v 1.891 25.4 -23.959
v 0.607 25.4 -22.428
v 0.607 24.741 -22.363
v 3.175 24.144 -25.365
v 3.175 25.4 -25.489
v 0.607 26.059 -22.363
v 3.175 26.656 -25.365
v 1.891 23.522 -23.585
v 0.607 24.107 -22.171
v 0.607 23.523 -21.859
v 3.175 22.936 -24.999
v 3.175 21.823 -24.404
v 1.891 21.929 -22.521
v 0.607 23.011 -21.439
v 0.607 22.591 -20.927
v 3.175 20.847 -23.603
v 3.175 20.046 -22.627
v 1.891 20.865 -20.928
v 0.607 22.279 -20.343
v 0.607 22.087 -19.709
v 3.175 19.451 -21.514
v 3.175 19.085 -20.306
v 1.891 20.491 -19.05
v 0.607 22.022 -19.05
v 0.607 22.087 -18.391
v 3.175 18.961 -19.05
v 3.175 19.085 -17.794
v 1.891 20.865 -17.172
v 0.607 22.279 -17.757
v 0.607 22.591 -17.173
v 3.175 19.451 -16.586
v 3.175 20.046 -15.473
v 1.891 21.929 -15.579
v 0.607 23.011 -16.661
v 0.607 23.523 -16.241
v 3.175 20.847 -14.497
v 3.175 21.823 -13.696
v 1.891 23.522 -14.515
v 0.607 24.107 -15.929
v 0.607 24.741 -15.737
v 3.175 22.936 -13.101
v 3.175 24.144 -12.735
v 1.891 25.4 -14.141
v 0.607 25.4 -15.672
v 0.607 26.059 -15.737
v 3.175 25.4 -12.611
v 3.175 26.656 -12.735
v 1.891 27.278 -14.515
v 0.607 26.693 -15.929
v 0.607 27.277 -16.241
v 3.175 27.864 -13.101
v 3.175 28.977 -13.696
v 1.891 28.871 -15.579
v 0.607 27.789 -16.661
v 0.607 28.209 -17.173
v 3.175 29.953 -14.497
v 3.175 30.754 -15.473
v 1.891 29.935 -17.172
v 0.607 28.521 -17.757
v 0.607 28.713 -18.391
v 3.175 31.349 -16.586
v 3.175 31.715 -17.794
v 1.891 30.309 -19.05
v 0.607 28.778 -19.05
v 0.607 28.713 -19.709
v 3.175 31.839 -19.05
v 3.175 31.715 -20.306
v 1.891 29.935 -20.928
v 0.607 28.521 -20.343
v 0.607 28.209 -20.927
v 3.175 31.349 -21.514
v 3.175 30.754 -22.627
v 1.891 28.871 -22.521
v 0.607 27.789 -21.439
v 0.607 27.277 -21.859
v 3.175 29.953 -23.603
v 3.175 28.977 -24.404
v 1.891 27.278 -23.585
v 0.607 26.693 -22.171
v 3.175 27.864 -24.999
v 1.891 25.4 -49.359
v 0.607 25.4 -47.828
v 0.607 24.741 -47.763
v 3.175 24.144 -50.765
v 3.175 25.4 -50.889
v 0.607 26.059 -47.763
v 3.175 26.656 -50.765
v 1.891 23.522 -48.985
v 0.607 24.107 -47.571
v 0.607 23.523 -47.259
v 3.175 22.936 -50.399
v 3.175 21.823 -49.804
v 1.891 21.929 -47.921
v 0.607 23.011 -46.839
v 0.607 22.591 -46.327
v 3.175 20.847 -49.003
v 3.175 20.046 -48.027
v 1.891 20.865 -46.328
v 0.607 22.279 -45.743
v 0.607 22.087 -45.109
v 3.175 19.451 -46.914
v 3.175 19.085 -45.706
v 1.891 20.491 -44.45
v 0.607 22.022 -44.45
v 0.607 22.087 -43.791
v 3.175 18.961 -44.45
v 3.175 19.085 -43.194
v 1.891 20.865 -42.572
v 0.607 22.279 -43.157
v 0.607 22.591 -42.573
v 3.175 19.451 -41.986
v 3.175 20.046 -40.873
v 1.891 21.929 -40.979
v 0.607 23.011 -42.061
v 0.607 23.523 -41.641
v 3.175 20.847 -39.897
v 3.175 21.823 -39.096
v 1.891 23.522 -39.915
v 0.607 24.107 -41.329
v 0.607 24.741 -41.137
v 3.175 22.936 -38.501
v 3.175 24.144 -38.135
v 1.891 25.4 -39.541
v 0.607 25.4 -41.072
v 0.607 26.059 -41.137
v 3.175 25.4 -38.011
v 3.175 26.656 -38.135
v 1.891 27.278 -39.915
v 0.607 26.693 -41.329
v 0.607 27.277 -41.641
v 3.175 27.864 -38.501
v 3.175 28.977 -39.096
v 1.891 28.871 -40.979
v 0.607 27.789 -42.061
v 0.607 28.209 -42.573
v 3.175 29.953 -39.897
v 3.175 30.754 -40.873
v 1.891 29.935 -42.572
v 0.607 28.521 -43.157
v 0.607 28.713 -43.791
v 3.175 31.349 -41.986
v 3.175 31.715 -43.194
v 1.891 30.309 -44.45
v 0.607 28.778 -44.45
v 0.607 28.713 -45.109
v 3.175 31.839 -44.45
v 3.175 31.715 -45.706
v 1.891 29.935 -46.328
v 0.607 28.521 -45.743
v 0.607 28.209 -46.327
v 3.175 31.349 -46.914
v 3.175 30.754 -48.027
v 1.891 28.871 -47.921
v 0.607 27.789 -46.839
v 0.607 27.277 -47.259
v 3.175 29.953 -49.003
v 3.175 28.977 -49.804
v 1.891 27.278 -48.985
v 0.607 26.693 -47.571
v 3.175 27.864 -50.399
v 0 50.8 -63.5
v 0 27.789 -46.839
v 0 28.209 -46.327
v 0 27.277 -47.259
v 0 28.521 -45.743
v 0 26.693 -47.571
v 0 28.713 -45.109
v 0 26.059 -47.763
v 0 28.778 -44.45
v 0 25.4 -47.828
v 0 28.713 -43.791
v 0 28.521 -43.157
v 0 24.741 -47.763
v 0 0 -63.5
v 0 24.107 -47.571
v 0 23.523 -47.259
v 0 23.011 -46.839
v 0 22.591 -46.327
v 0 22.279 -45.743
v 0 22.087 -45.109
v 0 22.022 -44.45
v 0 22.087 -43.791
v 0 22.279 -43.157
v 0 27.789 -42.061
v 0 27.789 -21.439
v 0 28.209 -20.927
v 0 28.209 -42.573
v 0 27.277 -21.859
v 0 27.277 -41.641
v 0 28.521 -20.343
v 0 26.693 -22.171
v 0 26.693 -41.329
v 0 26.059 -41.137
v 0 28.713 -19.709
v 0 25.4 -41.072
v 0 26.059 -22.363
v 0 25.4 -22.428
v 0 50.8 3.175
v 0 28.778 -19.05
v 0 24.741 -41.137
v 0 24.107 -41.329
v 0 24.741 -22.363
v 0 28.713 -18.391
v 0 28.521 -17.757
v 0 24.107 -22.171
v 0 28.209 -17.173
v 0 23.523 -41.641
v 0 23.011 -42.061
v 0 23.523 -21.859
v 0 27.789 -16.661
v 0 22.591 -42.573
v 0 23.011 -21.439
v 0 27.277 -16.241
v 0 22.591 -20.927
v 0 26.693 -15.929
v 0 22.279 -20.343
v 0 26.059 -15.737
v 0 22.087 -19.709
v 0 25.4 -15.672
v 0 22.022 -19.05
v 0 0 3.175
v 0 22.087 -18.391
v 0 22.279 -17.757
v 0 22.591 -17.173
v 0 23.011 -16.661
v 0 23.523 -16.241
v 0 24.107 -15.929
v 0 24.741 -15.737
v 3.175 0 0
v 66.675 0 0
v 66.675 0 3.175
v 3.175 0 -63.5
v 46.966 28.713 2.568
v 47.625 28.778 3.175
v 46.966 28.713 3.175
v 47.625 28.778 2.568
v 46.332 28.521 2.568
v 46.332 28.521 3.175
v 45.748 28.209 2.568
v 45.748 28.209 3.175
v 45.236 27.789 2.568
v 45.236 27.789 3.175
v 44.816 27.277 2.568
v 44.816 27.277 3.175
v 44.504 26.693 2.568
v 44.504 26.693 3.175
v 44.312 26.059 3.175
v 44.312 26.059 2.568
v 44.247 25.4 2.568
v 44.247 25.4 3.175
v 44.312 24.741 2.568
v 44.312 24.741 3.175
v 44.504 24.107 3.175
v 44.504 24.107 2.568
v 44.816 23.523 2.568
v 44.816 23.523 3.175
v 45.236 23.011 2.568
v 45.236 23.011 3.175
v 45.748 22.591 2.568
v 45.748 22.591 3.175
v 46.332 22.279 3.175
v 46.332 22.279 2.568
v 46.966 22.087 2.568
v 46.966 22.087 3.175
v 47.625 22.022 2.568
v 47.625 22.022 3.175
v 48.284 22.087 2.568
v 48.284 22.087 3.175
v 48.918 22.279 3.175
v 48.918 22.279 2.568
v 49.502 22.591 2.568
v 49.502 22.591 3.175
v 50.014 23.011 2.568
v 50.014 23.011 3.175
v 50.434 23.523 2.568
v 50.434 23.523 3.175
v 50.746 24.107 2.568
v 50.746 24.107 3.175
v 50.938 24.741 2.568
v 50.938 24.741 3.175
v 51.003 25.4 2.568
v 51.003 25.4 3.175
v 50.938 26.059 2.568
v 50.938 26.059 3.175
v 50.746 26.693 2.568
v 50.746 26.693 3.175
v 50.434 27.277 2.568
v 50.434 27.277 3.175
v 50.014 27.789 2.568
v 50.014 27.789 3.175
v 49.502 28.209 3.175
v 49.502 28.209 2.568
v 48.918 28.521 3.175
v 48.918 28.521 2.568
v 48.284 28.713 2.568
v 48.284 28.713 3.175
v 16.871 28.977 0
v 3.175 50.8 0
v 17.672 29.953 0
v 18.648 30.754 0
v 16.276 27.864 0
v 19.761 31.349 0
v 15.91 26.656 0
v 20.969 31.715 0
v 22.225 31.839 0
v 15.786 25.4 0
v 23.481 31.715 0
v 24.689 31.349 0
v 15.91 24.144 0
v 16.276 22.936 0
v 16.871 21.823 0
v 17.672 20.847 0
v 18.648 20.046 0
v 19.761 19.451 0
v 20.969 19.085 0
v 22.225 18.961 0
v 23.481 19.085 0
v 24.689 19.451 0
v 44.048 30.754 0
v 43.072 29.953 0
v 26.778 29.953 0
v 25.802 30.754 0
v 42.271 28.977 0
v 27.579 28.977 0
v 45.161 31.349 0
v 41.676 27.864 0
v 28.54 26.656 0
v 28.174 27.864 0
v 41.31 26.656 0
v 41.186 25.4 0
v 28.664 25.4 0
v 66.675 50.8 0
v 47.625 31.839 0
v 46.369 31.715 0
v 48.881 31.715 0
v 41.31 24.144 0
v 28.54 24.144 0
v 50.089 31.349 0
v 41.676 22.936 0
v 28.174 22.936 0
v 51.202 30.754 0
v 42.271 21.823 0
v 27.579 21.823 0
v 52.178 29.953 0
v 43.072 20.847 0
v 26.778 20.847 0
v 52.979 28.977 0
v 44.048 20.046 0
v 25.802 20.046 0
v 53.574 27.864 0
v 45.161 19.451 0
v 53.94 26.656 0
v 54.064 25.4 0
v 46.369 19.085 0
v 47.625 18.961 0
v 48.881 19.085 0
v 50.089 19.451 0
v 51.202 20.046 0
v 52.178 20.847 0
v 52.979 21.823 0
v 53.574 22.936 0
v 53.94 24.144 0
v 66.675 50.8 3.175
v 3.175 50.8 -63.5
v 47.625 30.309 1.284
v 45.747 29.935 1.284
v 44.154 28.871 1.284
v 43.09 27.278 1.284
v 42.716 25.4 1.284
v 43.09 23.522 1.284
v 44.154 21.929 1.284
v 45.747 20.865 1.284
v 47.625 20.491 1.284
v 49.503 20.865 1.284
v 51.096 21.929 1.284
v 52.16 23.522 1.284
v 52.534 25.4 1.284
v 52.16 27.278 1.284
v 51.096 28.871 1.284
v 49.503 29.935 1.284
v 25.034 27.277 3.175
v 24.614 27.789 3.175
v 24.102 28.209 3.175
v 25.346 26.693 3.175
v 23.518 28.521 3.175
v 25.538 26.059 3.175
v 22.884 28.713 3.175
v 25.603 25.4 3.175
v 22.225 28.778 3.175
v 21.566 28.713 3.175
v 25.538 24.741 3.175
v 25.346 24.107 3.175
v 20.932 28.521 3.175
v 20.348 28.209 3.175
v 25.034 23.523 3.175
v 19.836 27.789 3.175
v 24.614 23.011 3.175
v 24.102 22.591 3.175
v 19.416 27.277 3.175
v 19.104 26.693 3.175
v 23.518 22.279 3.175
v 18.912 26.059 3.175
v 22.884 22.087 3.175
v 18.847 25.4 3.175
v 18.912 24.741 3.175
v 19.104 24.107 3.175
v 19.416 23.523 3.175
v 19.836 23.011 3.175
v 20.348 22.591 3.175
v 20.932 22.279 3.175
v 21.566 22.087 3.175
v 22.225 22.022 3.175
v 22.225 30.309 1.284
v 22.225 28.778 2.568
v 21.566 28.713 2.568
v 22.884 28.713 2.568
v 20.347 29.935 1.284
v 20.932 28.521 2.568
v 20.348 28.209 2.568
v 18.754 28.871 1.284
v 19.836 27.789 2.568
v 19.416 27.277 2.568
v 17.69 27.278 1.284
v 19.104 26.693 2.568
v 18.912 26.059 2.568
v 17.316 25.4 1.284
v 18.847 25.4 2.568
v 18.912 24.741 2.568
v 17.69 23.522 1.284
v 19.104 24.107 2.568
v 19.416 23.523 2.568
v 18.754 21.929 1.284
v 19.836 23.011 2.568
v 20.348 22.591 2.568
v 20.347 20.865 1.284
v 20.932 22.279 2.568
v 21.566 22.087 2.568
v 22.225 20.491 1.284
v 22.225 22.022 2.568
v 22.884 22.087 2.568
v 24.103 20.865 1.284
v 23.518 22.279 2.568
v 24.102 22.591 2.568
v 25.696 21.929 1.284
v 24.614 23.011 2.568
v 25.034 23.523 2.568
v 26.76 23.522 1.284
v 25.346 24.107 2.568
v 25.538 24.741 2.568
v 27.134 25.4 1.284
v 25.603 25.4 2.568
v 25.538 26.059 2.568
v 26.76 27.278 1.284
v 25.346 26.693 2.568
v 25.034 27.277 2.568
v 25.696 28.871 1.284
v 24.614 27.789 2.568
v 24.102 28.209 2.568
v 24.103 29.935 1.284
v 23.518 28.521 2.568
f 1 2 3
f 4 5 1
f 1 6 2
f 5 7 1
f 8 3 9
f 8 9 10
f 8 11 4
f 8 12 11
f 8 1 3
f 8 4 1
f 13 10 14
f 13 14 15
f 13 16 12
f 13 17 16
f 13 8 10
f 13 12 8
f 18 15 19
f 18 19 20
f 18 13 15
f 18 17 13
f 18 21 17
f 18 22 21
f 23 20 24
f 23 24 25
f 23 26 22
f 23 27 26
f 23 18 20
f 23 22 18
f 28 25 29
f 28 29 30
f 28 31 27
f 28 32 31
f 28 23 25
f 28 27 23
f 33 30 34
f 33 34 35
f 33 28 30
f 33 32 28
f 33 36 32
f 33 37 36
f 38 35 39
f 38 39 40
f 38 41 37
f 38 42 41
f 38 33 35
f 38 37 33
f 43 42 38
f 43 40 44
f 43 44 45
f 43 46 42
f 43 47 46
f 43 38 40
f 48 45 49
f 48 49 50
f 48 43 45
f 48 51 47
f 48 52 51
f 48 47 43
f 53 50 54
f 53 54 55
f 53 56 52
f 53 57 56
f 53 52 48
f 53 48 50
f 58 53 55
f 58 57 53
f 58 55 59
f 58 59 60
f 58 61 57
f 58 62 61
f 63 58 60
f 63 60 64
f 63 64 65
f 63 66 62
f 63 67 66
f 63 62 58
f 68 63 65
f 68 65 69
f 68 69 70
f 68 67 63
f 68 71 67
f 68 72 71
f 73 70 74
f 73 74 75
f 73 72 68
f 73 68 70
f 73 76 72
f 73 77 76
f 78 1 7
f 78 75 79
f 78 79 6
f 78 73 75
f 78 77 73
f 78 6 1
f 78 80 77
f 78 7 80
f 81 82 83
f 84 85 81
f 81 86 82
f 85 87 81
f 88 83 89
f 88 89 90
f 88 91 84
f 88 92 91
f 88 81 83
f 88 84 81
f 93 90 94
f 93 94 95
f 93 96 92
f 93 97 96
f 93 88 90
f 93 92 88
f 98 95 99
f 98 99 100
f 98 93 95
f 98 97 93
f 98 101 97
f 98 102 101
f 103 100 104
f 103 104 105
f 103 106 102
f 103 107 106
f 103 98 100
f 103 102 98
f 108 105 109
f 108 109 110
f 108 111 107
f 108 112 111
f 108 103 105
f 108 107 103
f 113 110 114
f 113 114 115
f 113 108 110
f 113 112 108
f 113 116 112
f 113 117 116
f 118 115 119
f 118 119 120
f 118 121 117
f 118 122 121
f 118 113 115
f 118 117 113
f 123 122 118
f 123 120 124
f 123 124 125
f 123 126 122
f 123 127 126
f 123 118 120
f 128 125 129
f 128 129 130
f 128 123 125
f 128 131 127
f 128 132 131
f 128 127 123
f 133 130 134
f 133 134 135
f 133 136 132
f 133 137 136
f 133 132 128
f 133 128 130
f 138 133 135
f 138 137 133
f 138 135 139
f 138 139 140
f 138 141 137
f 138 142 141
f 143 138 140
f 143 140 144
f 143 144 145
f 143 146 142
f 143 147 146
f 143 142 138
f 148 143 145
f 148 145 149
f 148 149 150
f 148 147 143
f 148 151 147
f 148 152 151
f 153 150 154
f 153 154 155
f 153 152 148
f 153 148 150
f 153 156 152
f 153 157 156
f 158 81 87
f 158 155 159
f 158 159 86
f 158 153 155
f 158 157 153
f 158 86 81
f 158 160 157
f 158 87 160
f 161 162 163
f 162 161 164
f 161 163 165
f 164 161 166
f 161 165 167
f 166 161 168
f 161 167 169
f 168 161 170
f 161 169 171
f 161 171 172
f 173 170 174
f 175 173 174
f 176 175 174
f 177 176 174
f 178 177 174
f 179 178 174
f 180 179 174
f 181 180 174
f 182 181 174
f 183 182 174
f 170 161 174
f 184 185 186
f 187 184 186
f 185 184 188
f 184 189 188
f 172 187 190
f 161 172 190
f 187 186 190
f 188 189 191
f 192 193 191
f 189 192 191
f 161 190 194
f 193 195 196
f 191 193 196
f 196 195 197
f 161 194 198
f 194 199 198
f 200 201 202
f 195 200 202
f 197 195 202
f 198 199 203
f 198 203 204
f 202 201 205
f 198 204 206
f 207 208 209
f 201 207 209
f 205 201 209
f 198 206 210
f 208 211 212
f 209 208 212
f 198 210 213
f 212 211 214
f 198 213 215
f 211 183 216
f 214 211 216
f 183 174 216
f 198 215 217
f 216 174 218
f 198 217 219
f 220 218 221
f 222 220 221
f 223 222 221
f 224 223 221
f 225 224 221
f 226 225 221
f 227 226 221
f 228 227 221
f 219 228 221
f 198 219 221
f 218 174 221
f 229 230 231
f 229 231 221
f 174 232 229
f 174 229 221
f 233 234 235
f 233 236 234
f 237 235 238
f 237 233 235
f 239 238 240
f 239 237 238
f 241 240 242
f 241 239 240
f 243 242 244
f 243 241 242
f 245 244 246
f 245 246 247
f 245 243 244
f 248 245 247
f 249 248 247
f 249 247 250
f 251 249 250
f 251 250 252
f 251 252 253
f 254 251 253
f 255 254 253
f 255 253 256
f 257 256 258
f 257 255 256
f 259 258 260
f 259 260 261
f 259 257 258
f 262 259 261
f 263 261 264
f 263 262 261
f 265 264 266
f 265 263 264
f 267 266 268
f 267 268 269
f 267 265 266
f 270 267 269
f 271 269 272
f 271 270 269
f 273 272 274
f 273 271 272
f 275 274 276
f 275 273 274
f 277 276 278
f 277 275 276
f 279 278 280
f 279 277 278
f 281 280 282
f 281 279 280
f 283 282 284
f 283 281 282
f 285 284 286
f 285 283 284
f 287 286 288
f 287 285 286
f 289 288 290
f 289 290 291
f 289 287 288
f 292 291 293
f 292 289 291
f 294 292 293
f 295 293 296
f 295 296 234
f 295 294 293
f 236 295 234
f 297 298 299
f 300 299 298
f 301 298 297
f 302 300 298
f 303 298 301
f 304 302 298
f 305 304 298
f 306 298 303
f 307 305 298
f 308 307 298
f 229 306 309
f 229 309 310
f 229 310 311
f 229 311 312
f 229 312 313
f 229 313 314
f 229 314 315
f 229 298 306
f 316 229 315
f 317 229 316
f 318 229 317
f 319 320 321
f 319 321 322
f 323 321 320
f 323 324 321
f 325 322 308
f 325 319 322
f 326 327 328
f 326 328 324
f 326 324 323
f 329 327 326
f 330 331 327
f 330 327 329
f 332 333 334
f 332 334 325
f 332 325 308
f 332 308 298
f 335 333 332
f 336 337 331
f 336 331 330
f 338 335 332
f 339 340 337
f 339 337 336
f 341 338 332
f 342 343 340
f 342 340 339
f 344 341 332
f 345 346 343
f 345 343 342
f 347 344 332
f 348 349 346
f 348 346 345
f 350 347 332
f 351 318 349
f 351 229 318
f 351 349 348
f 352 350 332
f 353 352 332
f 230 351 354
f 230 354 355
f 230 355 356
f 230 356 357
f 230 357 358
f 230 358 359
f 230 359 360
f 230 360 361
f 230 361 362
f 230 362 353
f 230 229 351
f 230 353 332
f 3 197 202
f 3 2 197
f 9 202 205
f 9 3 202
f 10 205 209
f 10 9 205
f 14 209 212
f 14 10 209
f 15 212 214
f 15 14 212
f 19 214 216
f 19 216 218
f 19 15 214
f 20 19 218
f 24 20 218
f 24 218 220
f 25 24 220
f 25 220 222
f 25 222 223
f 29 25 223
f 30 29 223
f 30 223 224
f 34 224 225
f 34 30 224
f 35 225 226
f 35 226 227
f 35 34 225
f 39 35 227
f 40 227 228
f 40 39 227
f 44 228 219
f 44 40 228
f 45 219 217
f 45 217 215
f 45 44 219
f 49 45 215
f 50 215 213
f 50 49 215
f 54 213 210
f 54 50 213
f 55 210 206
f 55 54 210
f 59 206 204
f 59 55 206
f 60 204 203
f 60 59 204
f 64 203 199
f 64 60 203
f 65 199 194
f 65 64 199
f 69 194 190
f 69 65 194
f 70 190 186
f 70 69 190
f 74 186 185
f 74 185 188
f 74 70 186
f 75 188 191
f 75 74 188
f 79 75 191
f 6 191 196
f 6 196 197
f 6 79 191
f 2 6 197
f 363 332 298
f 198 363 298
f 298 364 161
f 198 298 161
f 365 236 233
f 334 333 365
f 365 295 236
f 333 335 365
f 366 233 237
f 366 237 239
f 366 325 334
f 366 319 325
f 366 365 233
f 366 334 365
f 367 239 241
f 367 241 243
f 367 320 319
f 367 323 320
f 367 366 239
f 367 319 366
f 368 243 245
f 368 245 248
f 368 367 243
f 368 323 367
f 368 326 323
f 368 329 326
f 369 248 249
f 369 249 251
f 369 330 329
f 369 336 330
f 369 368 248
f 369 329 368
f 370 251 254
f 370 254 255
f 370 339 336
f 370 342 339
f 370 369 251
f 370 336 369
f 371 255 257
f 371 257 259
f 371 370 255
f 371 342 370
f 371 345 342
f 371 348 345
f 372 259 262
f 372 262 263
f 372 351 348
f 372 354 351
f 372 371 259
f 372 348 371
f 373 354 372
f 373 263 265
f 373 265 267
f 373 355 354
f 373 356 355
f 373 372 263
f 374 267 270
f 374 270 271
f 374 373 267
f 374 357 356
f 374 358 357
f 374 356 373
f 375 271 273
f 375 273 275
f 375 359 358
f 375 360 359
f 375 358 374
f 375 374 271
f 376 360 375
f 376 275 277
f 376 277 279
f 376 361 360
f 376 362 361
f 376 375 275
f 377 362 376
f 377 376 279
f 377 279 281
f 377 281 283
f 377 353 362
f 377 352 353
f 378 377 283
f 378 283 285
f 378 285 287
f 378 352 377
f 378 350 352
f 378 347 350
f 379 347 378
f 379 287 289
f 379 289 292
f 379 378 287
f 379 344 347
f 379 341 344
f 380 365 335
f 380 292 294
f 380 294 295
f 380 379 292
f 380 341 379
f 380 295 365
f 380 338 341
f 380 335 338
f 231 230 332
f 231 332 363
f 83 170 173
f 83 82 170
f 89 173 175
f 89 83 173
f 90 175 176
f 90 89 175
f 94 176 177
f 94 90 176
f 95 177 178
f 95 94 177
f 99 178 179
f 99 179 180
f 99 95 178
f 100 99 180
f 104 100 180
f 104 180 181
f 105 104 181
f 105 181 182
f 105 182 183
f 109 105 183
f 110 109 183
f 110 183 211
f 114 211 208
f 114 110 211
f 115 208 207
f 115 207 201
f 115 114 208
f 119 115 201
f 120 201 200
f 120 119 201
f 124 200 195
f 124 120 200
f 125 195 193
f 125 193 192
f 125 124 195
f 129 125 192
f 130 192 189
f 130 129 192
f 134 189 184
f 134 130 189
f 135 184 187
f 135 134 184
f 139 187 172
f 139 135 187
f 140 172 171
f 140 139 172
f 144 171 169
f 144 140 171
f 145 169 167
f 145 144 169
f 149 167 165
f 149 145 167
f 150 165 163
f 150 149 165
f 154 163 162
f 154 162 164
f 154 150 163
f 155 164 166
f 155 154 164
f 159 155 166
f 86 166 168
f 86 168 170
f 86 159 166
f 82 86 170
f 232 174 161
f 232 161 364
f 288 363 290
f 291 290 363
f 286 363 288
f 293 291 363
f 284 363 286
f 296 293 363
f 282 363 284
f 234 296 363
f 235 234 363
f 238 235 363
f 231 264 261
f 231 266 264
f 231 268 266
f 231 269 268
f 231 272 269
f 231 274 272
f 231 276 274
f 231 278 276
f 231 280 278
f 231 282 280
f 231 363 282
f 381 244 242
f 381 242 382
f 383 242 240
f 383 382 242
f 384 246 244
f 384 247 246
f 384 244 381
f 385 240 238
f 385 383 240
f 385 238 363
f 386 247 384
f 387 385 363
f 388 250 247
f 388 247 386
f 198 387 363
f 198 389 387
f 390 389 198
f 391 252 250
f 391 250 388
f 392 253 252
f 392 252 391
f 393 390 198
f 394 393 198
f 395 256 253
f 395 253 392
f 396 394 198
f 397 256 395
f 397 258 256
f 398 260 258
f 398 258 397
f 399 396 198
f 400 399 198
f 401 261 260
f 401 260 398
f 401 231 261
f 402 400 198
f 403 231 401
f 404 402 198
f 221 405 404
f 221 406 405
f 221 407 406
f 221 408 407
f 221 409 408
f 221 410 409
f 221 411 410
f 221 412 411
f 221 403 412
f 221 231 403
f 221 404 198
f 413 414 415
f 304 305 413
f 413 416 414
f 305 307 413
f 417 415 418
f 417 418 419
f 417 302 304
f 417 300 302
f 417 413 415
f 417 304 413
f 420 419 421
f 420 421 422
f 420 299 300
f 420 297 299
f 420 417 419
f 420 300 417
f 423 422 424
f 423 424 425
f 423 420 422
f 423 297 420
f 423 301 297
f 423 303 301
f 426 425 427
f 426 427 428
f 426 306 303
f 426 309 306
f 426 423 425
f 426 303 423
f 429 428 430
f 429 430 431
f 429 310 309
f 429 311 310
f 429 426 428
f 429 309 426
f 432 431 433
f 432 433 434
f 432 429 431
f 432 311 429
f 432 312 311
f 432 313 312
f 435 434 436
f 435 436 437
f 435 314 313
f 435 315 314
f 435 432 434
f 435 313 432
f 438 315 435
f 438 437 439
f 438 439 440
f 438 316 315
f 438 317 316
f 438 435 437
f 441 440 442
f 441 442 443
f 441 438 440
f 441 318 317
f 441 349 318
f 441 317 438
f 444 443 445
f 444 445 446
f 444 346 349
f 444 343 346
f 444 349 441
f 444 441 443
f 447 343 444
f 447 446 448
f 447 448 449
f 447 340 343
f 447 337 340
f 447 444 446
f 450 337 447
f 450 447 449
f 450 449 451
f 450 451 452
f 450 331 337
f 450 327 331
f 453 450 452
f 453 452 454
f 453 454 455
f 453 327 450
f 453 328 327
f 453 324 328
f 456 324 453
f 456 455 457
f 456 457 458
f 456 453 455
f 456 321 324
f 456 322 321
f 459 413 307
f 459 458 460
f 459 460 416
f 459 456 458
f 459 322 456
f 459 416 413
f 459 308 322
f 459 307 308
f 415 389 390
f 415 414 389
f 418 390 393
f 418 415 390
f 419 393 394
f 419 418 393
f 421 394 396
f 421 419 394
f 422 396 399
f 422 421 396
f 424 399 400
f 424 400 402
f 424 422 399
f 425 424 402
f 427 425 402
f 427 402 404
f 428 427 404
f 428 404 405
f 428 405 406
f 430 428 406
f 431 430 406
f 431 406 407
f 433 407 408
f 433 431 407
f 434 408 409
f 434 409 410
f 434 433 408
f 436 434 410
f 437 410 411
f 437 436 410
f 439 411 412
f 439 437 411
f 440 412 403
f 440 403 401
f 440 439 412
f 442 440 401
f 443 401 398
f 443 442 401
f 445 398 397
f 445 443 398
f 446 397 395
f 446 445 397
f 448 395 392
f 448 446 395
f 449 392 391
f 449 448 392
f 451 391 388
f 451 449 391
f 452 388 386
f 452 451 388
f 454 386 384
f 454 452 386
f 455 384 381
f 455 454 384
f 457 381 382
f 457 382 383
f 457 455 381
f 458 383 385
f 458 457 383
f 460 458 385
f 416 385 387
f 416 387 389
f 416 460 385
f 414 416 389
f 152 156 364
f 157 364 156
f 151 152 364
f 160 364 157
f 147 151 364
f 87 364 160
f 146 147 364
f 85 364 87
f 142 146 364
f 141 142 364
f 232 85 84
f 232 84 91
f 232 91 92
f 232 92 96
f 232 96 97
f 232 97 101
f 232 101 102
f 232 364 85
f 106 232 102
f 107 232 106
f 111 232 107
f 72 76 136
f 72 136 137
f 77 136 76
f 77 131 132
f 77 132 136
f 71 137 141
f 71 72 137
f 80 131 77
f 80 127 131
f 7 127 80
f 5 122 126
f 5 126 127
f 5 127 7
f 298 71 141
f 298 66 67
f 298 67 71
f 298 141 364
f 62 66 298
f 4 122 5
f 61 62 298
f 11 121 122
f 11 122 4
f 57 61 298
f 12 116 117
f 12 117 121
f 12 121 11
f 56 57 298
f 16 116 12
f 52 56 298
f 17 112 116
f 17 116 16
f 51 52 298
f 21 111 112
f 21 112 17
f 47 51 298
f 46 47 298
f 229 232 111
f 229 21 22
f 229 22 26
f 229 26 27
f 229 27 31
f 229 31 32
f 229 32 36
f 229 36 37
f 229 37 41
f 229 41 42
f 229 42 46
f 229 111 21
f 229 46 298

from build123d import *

# Parameters (mm, degrees)
BOSS_EXTRUDE1_DEPTH                            = 50.8
CSK_FOR_1_4_FLAT_HEAD_MACHINE_SCREW_2_COUNT    = 2
CSK_FOR_1_4_FLAT_HEAD_MACHINE_SCREW_2_PITCH    = 25.4
CSK_FOR_1_4_FLAT_HEAD_MACHINE_SCREW_3_AT_COUNT = 2
CSK_FOR_1_4_FLAT_HEAD_MACHINE_SCREW_3_AT_PITCH = 25.4


with BuildPart() as part:
    # Sketch1 → Boss-Extrude1 (new body)
    with BuildSketch(Plane(origin=(0, 0, 0), x_dir=(1, 0, 0), z_dir=(0, 1, 0))):
        Polygon((0, 0), (0, 63.5), (3.175, 63.5), (3.175, 0), (66.675, 0), (66.675, -3.175), (0, -3.175), align=None)
    extrude(amount=BOSS_EXTRUDE1_DEPTH)

    # Sketch4 → CSK for 1_4 Flat Head Machine Screw _100 (revolve, cut)
    with BuildSketch(Plane(origin=(3.175, 25.4, -19.05), x_dir=(0, 0, -1), z_dir=(0, 1, 0))):
        Polygon((0, 0), (0, 3.175), (3.3782, 3.175), (3.3782, 2.568232241), (6.4389, 0), align=None)
    csk_for_1_4_flat_head_machine_screw_100 = revolve(axis=Axis((9.525, 25.4, -19.05), (-1, 0, 0)), mode=Mode.SUBTRACT)

    # CSK for 1_4 Flat Head Machine Screw  2: CSK for 1_4 Flat Head Machine Screw _100 ×2
    with Locations(*[(0, 0, -i * CSK_FOR_1_4_FLAT_HEAD_MACHINE_SCREW_2_PITCH) for i in range(1, CSK_FOR_1_4_FLAT_HEAD_MACHINE_SCREW_2_COUNT)]):
        add(csk_for_1_4_flat_head_machine_screw_100, mode=Mode.SUBTRACT)

    # Sketch6 → CSK for 1_4 Flat Head Machine Screw  3 (revolve, cut)
    with BuildSketch(Plane(origin=(47.625, 25.4, 0), x_dir=(0, 1, 0), z_dir=(1, 0, 0))):
        Polygon((0, 0), (0, 3.175), (3.3782, 3.175), (3.3782, 2.568232241), (6.4389, 0), align=None)
    csk_for_1_4_flat_head_machine_screw_3 = revolve(axis=Axis((47.625, 25.4, -6.35), (0, 0, 1)), mode=Mode.SUBTRACT)

    # CSK for 1_4 Flat Head Machine Screw 3 at: CSK for 1_4 Flat Head Machine Screw  3 ×2
    with Locations(*[(-i * CSK_FOR_1_4_FLAT_HEAD_MACHINE_SCREW_3_AT_PITCH, 0, 0) for i in range(1, CSK_FOR_1_4_FLAT_HEAD_MACHINE_SCREW_3_AT_COUNT)]):
        add(csk_for_1_4_flat_head_machine_screw_3, mode=Mode.SUBTRACT)


solid = part.part
